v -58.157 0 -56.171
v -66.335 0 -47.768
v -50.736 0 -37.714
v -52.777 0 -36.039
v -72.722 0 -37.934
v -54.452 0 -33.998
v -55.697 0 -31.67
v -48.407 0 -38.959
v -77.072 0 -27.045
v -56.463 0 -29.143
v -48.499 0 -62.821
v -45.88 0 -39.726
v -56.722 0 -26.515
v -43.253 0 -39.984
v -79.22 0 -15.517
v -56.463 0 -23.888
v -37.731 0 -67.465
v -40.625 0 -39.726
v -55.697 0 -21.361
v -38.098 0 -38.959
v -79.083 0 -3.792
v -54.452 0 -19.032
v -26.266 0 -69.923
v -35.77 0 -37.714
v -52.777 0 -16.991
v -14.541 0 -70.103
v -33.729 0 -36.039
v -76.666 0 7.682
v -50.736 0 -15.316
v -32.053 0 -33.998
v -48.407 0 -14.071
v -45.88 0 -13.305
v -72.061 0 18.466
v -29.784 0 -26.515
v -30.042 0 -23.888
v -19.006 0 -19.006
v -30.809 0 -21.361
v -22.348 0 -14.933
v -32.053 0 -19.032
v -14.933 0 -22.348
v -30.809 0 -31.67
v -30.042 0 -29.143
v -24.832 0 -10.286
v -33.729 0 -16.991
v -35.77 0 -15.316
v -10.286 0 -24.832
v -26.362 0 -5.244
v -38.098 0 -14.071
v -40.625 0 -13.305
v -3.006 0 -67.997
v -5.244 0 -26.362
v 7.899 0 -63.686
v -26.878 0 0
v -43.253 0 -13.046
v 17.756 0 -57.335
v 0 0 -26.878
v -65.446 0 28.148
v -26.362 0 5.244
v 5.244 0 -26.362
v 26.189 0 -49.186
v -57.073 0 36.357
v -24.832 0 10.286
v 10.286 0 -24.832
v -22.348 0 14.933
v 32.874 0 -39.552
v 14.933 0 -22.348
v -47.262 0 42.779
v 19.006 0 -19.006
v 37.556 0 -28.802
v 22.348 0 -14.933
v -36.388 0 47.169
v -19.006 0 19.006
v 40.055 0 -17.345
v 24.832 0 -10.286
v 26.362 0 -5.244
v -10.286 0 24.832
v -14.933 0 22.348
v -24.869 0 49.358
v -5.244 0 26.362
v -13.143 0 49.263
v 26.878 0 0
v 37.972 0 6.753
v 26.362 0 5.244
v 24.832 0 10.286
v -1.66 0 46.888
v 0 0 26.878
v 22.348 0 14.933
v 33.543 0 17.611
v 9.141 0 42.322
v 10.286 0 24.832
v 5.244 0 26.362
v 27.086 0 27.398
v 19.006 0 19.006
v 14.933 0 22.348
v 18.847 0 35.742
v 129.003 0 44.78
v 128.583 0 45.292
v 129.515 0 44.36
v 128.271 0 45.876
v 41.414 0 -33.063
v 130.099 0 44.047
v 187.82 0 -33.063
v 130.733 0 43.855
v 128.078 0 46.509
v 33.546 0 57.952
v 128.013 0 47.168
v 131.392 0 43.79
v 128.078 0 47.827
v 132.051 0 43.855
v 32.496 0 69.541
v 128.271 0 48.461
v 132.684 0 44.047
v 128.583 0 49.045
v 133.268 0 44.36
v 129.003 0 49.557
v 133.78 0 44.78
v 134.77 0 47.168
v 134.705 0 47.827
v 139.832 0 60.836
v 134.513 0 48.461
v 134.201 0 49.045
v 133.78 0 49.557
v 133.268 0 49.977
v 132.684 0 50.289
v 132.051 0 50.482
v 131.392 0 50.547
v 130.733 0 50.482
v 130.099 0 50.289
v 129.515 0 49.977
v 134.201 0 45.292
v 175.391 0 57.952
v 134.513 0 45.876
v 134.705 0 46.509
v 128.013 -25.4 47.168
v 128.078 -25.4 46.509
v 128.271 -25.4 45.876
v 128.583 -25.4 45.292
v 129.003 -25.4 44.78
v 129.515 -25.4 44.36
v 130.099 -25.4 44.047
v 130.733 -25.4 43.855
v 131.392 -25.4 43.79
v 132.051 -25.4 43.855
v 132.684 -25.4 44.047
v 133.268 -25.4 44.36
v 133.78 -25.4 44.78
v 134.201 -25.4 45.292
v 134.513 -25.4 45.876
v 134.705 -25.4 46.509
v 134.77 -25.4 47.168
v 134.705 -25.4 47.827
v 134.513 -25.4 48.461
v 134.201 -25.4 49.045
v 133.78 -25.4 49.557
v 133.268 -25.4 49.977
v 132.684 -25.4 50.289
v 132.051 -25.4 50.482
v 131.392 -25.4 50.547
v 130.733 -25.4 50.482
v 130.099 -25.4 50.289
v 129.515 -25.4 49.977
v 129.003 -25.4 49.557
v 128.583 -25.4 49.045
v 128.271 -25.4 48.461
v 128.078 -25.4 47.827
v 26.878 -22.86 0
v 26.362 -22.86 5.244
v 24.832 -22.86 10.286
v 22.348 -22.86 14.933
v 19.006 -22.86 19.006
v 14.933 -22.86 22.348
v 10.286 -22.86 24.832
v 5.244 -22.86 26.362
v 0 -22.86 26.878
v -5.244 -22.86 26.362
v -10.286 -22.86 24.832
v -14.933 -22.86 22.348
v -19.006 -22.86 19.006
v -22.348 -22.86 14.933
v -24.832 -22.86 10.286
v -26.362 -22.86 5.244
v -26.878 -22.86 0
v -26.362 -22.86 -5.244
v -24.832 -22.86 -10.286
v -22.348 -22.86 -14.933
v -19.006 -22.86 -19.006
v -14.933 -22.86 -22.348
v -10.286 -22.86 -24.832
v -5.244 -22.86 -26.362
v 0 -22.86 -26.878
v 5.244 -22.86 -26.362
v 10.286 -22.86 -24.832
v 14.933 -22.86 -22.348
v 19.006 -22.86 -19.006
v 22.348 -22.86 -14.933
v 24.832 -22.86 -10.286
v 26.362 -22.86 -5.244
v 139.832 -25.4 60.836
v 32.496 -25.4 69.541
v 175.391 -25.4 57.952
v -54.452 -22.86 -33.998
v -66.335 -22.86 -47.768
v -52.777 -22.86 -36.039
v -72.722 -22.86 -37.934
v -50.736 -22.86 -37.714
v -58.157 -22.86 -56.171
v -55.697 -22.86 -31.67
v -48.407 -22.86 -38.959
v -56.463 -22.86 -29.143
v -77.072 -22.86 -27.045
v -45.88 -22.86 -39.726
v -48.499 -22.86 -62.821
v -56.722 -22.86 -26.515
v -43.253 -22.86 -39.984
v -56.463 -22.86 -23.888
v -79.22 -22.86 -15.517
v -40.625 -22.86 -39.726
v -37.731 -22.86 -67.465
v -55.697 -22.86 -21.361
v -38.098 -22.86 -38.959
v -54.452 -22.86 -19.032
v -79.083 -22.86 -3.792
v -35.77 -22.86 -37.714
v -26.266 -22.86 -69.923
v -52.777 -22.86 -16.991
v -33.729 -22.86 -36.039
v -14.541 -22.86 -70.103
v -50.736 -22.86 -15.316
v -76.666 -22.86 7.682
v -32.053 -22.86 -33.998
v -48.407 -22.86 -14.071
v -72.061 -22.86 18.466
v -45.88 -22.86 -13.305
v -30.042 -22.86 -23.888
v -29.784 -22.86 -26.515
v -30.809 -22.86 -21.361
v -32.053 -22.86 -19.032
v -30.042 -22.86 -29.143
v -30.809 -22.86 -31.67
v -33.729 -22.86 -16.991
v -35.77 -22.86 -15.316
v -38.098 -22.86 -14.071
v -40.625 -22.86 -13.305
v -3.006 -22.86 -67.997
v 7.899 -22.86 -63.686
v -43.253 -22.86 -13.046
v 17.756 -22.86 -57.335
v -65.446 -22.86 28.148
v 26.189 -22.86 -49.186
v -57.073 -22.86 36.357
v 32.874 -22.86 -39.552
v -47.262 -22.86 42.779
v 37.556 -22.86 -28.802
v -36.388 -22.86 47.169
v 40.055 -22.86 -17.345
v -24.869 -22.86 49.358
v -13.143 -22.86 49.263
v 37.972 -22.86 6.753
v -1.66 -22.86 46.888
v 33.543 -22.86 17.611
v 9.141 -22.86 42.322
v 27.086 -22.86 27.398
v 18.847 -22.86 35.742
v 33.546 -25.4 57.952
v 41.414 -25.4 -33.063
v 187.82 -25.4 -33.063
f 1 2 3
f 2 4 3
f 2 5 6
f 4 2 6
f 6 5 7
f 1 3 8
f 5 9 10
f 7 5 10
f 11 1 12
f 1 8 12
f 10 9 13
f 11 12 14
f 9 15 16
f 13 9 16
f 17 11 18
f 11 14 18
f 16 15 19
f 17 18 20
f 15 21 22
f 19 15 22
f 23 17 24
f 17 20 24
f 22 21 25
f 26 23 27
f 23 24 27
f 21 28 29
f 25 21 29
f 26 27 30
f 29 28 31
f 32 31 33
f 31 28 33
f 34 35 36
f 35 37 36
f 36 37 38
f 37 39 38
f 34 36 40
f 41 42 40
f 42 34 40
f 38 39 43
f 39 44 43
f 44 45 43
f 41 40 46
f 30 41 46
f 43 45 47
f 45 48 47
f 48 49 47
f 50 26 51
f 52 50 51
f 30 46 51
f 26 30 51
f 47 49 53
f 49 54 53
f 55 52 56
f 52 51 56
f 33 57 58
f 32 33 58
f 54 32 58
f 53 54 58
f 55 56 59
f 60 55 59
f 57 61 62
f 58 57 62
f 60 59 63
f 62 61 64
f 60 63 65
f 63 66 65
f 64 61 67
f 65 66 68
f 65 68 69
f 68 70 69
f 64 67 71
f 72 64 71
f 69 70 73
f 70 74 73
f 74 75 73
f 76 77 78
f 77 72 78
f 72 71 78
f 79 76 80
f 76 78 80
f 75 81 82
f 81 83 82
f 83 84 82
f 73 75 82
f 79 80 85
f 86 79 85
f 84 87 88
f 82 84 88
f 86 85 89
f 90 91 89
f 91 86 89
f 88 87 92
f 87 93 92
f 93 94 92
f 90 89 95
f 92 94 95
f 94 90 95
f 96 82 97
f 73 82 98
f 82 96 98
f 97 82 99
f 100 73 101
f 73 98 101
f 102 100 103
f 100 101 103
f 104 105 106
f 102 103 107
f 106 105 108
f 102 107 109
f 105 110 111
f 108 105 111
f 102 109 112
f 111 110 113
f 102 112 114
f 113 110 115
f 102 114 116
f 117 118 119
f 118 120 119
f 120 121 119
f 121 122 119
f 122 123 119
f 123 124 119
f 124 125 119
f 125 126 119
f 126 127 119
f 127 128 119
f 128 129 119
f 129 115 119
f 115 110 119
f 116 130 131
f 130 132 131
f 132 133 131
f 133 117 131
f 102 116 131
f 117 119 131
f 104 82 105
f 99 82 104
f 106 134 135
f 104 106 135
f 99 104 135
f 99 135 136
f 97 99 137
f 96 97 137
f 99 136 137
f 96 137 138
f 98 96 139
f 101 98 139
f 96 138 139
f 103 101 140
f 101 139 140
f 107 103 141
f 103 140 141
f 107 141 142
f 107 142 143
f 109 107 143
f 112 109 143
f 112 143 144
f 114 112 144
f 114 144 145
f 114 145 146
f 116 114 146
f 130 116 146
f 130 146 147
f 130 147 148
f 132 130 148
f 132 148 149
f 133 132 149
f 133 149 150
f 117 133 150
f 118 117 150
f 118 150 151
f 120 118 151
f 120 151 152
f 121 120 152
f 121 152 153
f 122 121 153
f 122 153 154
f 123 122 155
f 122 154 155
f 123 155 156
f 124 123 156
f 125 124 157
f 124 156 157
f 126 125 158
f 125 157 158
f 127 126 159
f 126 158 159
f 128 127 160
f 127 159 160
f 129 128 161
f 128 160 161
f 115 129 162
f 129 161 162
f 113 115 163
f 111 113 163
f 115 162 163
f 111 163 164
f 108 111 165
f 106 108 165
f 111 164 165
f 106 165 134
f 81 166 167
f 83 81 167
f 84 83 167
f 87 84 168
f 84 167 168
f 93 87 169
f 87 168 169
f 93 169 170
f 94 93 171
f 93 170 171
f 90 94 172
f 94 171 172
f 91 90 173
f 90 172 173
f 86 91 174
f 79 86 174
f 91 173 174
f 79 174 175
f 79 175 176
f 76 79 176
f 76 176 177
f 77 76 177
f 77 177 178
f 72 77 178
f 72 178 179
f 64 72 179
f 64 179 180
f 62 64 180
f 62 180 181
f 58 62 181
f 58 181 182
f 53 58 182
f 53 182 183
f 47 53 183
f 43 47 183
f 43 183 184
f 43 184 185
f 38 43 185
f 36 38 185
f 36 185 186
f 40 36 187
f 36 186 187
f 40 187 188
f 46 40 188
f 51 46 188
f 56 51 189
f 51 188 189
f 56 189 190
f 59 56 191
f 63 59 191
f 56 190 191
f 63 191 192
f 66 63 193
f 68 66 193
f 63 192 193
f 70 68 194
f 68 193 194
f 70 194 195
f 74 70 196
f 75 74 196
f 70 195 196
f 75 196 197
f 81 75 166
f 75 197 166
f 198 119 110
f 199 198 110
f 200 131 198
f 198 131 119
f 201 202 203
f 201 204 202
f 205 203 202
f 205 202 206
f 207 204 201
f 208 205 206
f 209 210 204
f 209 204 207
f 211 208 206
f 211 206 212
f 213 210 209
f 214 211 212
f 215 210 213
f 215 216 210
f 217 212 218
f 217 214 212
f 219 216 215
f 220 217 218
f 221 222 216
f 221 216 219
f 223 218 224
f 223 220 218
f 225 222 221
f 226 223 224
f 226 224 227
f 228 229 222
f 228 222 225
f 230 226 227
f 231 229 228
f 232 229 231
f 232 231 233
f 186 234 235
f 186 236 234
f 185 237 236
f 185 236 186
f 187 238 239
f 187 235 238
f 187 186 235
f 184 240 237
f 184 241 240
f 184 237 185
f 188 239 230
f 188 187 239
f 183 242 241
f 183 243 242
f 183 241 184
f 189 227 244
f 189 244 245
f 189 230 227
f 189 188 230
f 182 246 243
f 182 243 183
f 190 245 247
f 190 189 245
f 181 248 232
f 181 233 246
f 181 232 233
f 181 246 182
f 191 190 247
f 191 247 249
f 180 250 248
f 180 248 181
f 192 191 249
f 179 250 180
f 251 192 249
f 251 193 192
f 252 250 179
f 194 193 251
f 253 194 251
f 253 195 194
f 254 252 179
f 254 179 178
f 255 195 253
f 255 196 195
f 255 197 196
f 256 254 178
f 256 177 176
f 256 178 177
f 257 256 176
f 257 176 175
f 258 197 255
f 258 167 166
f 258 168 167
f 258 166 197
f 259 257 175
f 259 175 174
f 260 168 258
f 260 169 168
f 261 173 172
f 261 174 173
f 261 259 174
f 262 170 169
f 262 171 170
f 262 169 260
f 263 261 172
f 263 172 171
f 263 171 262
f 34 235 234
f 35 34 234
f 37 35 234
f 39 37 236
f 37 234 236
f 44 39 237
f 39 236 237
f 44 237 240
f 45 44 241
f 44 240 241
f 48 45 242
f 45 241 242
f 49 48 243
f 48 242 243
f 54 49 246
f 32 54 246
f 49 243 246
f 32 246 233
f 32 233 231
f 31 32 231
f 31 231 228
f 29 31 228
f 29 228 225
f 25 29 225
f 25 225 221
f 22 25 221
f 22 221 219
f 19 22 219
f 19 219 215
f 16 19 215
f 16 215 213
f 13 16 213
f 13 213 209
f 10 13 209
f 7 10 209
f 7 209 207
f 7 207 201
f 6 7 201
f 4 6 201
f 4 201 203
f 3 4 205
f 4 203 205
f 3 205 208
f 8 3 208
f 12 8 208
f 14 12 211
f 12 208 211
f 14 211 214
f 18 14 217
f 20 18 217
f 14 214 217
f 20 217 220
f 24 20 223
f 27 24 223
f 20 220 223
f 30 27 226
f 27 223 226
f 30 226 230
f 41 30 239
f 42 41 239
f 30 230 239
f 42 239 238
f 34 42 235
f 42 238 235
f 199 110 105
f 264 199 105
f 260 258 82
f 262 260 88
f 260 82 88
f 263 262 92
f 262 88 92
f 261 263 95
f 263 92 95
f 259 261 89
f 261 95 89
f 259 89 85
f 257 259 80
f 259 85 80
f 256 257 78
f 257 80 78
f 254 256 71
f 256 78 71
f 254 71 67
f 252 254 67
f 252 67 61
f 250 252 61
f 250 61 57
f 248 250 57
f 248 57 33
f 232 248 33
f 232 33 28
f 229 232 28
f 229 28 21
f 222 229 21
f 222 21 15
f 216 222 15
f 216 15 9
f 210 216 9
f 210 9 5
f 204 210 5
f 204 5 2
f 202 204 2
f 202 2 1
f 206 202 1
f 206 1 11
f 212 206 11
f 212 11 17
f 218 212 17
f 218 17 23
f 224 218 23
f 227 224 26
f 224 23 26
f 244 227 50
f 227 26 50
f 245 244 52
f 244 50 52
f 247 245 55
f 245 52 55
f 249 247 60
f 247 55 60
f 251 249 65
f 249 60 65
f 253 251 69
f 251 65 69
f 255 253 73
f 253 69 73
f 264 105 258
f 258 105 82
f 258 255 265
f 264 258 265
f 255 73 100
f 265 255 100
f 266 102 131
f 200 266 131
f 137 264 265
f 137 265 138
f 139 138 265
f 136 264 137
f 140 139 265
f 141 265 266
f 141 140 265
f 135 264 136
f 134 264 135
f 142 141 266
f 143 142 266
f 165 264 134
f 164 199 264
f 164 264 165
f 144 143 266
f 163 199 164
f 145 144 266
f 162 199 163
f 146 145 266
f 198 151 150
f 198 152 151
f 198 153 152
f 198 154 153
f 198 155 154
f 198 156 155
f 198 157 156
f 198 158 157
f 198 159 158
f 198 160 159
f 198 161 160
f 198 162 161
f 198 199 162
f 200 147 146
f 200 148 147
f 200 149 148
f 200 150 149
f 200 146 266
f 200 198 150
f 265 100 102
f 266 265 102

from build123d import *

# Parameters (mm, degrees)
F0_R     = 59.9535716792
F1_DEPTH = 22.86
F2_R     = 26.8781341555
F3_DEPTH = 22.861
F4_R     = 13.4691567937
F5_DEPTH = 22.861
F7_DEPTH = 25.4
F8_D     = 6.7564


with BuildPart() as f1:
    # F0 (on Front) → F1 (new body)
    with BuildSketch(Plane.XZ):
        with Locations((-19.4891095161, -10.3535922244)):
            Circle(F0_R)
    extrude(amount=F1_DEPTH)

    # F2 (on face) → F3 (cut, through all)
    with BuildSketch(Plane.XZ.offset(22.86)):
        Circle(F2_R)
    extrude(amount=-F3_DEPTH, mode=Mode.SUBTRACT)

    # F4 (on face) → F5 (cut, through all)
    with BuildSketch(Plane.XZ.offset(22.86)):
        with Locations((-43.2526767254, -26.5152305365)):
            Circle(F4_R)
    extrude(amount=-F5_DEPTH, mode=Mode.SUBTRACT)

    # F6 (on Front) → F7 (join)
    with BuildSketch(Plane.XZ):
        with BuildLine():
            Line((125.263456354, 62.0171219158), (32.4955508113, 69.5405378938))
            Line((32.4955508113, 69.5405378938), (33.5459113121, 57.9518266022))
            Line((33.5459113121, 57.9518266022), (41.4141863585, -33.0627560616))
            Line((41.4141863585, -33.0627560616), (187.8204643726, -33.0627560616))
            Line((187.8204643726, -33.0627560616), (175.3908097744, 57.9518266022))
            Line((175.3908097744, 57.9518266022), (139.8324502944, 60.8355861125))
            ThreePointArc((139.8324502944, 60.8355861125), (145.4206878129, 54.9930315803), (147.4552232917, 47.1684224904))
            ThreePointArc((147.4552232917, 47.1684224904), (122.458617796, 33.8177821083), (125.263456354, 62.0171219158))
        make_face()
        with BuildLine():
            Line((139.8324502944, 60.8355861125), (125.263456354, 62.0171219158))
            ThreePointArc((125.263456354, 62.0171219158), (122.458617796, 33.8177821083), (147.4552232917, 47.1684224904))
            ThreePointArc((147.4552232917, 47.1684224904), (145.4206878129, 54.9930315803), (139.8324502944, 60.8355861125))
        make_face()
    extrude(amount=F7_DEPTH)

    # F8 (through all)
    with Locations(Plane(origin=(0, 0, 0), x_dir=(1, 0, 0), z_dir=(0, 1, 0))):
        with Locations((131.3916444778, -47.1684224904)):
            Hole(F8_D / 2)


solid = f1.part
